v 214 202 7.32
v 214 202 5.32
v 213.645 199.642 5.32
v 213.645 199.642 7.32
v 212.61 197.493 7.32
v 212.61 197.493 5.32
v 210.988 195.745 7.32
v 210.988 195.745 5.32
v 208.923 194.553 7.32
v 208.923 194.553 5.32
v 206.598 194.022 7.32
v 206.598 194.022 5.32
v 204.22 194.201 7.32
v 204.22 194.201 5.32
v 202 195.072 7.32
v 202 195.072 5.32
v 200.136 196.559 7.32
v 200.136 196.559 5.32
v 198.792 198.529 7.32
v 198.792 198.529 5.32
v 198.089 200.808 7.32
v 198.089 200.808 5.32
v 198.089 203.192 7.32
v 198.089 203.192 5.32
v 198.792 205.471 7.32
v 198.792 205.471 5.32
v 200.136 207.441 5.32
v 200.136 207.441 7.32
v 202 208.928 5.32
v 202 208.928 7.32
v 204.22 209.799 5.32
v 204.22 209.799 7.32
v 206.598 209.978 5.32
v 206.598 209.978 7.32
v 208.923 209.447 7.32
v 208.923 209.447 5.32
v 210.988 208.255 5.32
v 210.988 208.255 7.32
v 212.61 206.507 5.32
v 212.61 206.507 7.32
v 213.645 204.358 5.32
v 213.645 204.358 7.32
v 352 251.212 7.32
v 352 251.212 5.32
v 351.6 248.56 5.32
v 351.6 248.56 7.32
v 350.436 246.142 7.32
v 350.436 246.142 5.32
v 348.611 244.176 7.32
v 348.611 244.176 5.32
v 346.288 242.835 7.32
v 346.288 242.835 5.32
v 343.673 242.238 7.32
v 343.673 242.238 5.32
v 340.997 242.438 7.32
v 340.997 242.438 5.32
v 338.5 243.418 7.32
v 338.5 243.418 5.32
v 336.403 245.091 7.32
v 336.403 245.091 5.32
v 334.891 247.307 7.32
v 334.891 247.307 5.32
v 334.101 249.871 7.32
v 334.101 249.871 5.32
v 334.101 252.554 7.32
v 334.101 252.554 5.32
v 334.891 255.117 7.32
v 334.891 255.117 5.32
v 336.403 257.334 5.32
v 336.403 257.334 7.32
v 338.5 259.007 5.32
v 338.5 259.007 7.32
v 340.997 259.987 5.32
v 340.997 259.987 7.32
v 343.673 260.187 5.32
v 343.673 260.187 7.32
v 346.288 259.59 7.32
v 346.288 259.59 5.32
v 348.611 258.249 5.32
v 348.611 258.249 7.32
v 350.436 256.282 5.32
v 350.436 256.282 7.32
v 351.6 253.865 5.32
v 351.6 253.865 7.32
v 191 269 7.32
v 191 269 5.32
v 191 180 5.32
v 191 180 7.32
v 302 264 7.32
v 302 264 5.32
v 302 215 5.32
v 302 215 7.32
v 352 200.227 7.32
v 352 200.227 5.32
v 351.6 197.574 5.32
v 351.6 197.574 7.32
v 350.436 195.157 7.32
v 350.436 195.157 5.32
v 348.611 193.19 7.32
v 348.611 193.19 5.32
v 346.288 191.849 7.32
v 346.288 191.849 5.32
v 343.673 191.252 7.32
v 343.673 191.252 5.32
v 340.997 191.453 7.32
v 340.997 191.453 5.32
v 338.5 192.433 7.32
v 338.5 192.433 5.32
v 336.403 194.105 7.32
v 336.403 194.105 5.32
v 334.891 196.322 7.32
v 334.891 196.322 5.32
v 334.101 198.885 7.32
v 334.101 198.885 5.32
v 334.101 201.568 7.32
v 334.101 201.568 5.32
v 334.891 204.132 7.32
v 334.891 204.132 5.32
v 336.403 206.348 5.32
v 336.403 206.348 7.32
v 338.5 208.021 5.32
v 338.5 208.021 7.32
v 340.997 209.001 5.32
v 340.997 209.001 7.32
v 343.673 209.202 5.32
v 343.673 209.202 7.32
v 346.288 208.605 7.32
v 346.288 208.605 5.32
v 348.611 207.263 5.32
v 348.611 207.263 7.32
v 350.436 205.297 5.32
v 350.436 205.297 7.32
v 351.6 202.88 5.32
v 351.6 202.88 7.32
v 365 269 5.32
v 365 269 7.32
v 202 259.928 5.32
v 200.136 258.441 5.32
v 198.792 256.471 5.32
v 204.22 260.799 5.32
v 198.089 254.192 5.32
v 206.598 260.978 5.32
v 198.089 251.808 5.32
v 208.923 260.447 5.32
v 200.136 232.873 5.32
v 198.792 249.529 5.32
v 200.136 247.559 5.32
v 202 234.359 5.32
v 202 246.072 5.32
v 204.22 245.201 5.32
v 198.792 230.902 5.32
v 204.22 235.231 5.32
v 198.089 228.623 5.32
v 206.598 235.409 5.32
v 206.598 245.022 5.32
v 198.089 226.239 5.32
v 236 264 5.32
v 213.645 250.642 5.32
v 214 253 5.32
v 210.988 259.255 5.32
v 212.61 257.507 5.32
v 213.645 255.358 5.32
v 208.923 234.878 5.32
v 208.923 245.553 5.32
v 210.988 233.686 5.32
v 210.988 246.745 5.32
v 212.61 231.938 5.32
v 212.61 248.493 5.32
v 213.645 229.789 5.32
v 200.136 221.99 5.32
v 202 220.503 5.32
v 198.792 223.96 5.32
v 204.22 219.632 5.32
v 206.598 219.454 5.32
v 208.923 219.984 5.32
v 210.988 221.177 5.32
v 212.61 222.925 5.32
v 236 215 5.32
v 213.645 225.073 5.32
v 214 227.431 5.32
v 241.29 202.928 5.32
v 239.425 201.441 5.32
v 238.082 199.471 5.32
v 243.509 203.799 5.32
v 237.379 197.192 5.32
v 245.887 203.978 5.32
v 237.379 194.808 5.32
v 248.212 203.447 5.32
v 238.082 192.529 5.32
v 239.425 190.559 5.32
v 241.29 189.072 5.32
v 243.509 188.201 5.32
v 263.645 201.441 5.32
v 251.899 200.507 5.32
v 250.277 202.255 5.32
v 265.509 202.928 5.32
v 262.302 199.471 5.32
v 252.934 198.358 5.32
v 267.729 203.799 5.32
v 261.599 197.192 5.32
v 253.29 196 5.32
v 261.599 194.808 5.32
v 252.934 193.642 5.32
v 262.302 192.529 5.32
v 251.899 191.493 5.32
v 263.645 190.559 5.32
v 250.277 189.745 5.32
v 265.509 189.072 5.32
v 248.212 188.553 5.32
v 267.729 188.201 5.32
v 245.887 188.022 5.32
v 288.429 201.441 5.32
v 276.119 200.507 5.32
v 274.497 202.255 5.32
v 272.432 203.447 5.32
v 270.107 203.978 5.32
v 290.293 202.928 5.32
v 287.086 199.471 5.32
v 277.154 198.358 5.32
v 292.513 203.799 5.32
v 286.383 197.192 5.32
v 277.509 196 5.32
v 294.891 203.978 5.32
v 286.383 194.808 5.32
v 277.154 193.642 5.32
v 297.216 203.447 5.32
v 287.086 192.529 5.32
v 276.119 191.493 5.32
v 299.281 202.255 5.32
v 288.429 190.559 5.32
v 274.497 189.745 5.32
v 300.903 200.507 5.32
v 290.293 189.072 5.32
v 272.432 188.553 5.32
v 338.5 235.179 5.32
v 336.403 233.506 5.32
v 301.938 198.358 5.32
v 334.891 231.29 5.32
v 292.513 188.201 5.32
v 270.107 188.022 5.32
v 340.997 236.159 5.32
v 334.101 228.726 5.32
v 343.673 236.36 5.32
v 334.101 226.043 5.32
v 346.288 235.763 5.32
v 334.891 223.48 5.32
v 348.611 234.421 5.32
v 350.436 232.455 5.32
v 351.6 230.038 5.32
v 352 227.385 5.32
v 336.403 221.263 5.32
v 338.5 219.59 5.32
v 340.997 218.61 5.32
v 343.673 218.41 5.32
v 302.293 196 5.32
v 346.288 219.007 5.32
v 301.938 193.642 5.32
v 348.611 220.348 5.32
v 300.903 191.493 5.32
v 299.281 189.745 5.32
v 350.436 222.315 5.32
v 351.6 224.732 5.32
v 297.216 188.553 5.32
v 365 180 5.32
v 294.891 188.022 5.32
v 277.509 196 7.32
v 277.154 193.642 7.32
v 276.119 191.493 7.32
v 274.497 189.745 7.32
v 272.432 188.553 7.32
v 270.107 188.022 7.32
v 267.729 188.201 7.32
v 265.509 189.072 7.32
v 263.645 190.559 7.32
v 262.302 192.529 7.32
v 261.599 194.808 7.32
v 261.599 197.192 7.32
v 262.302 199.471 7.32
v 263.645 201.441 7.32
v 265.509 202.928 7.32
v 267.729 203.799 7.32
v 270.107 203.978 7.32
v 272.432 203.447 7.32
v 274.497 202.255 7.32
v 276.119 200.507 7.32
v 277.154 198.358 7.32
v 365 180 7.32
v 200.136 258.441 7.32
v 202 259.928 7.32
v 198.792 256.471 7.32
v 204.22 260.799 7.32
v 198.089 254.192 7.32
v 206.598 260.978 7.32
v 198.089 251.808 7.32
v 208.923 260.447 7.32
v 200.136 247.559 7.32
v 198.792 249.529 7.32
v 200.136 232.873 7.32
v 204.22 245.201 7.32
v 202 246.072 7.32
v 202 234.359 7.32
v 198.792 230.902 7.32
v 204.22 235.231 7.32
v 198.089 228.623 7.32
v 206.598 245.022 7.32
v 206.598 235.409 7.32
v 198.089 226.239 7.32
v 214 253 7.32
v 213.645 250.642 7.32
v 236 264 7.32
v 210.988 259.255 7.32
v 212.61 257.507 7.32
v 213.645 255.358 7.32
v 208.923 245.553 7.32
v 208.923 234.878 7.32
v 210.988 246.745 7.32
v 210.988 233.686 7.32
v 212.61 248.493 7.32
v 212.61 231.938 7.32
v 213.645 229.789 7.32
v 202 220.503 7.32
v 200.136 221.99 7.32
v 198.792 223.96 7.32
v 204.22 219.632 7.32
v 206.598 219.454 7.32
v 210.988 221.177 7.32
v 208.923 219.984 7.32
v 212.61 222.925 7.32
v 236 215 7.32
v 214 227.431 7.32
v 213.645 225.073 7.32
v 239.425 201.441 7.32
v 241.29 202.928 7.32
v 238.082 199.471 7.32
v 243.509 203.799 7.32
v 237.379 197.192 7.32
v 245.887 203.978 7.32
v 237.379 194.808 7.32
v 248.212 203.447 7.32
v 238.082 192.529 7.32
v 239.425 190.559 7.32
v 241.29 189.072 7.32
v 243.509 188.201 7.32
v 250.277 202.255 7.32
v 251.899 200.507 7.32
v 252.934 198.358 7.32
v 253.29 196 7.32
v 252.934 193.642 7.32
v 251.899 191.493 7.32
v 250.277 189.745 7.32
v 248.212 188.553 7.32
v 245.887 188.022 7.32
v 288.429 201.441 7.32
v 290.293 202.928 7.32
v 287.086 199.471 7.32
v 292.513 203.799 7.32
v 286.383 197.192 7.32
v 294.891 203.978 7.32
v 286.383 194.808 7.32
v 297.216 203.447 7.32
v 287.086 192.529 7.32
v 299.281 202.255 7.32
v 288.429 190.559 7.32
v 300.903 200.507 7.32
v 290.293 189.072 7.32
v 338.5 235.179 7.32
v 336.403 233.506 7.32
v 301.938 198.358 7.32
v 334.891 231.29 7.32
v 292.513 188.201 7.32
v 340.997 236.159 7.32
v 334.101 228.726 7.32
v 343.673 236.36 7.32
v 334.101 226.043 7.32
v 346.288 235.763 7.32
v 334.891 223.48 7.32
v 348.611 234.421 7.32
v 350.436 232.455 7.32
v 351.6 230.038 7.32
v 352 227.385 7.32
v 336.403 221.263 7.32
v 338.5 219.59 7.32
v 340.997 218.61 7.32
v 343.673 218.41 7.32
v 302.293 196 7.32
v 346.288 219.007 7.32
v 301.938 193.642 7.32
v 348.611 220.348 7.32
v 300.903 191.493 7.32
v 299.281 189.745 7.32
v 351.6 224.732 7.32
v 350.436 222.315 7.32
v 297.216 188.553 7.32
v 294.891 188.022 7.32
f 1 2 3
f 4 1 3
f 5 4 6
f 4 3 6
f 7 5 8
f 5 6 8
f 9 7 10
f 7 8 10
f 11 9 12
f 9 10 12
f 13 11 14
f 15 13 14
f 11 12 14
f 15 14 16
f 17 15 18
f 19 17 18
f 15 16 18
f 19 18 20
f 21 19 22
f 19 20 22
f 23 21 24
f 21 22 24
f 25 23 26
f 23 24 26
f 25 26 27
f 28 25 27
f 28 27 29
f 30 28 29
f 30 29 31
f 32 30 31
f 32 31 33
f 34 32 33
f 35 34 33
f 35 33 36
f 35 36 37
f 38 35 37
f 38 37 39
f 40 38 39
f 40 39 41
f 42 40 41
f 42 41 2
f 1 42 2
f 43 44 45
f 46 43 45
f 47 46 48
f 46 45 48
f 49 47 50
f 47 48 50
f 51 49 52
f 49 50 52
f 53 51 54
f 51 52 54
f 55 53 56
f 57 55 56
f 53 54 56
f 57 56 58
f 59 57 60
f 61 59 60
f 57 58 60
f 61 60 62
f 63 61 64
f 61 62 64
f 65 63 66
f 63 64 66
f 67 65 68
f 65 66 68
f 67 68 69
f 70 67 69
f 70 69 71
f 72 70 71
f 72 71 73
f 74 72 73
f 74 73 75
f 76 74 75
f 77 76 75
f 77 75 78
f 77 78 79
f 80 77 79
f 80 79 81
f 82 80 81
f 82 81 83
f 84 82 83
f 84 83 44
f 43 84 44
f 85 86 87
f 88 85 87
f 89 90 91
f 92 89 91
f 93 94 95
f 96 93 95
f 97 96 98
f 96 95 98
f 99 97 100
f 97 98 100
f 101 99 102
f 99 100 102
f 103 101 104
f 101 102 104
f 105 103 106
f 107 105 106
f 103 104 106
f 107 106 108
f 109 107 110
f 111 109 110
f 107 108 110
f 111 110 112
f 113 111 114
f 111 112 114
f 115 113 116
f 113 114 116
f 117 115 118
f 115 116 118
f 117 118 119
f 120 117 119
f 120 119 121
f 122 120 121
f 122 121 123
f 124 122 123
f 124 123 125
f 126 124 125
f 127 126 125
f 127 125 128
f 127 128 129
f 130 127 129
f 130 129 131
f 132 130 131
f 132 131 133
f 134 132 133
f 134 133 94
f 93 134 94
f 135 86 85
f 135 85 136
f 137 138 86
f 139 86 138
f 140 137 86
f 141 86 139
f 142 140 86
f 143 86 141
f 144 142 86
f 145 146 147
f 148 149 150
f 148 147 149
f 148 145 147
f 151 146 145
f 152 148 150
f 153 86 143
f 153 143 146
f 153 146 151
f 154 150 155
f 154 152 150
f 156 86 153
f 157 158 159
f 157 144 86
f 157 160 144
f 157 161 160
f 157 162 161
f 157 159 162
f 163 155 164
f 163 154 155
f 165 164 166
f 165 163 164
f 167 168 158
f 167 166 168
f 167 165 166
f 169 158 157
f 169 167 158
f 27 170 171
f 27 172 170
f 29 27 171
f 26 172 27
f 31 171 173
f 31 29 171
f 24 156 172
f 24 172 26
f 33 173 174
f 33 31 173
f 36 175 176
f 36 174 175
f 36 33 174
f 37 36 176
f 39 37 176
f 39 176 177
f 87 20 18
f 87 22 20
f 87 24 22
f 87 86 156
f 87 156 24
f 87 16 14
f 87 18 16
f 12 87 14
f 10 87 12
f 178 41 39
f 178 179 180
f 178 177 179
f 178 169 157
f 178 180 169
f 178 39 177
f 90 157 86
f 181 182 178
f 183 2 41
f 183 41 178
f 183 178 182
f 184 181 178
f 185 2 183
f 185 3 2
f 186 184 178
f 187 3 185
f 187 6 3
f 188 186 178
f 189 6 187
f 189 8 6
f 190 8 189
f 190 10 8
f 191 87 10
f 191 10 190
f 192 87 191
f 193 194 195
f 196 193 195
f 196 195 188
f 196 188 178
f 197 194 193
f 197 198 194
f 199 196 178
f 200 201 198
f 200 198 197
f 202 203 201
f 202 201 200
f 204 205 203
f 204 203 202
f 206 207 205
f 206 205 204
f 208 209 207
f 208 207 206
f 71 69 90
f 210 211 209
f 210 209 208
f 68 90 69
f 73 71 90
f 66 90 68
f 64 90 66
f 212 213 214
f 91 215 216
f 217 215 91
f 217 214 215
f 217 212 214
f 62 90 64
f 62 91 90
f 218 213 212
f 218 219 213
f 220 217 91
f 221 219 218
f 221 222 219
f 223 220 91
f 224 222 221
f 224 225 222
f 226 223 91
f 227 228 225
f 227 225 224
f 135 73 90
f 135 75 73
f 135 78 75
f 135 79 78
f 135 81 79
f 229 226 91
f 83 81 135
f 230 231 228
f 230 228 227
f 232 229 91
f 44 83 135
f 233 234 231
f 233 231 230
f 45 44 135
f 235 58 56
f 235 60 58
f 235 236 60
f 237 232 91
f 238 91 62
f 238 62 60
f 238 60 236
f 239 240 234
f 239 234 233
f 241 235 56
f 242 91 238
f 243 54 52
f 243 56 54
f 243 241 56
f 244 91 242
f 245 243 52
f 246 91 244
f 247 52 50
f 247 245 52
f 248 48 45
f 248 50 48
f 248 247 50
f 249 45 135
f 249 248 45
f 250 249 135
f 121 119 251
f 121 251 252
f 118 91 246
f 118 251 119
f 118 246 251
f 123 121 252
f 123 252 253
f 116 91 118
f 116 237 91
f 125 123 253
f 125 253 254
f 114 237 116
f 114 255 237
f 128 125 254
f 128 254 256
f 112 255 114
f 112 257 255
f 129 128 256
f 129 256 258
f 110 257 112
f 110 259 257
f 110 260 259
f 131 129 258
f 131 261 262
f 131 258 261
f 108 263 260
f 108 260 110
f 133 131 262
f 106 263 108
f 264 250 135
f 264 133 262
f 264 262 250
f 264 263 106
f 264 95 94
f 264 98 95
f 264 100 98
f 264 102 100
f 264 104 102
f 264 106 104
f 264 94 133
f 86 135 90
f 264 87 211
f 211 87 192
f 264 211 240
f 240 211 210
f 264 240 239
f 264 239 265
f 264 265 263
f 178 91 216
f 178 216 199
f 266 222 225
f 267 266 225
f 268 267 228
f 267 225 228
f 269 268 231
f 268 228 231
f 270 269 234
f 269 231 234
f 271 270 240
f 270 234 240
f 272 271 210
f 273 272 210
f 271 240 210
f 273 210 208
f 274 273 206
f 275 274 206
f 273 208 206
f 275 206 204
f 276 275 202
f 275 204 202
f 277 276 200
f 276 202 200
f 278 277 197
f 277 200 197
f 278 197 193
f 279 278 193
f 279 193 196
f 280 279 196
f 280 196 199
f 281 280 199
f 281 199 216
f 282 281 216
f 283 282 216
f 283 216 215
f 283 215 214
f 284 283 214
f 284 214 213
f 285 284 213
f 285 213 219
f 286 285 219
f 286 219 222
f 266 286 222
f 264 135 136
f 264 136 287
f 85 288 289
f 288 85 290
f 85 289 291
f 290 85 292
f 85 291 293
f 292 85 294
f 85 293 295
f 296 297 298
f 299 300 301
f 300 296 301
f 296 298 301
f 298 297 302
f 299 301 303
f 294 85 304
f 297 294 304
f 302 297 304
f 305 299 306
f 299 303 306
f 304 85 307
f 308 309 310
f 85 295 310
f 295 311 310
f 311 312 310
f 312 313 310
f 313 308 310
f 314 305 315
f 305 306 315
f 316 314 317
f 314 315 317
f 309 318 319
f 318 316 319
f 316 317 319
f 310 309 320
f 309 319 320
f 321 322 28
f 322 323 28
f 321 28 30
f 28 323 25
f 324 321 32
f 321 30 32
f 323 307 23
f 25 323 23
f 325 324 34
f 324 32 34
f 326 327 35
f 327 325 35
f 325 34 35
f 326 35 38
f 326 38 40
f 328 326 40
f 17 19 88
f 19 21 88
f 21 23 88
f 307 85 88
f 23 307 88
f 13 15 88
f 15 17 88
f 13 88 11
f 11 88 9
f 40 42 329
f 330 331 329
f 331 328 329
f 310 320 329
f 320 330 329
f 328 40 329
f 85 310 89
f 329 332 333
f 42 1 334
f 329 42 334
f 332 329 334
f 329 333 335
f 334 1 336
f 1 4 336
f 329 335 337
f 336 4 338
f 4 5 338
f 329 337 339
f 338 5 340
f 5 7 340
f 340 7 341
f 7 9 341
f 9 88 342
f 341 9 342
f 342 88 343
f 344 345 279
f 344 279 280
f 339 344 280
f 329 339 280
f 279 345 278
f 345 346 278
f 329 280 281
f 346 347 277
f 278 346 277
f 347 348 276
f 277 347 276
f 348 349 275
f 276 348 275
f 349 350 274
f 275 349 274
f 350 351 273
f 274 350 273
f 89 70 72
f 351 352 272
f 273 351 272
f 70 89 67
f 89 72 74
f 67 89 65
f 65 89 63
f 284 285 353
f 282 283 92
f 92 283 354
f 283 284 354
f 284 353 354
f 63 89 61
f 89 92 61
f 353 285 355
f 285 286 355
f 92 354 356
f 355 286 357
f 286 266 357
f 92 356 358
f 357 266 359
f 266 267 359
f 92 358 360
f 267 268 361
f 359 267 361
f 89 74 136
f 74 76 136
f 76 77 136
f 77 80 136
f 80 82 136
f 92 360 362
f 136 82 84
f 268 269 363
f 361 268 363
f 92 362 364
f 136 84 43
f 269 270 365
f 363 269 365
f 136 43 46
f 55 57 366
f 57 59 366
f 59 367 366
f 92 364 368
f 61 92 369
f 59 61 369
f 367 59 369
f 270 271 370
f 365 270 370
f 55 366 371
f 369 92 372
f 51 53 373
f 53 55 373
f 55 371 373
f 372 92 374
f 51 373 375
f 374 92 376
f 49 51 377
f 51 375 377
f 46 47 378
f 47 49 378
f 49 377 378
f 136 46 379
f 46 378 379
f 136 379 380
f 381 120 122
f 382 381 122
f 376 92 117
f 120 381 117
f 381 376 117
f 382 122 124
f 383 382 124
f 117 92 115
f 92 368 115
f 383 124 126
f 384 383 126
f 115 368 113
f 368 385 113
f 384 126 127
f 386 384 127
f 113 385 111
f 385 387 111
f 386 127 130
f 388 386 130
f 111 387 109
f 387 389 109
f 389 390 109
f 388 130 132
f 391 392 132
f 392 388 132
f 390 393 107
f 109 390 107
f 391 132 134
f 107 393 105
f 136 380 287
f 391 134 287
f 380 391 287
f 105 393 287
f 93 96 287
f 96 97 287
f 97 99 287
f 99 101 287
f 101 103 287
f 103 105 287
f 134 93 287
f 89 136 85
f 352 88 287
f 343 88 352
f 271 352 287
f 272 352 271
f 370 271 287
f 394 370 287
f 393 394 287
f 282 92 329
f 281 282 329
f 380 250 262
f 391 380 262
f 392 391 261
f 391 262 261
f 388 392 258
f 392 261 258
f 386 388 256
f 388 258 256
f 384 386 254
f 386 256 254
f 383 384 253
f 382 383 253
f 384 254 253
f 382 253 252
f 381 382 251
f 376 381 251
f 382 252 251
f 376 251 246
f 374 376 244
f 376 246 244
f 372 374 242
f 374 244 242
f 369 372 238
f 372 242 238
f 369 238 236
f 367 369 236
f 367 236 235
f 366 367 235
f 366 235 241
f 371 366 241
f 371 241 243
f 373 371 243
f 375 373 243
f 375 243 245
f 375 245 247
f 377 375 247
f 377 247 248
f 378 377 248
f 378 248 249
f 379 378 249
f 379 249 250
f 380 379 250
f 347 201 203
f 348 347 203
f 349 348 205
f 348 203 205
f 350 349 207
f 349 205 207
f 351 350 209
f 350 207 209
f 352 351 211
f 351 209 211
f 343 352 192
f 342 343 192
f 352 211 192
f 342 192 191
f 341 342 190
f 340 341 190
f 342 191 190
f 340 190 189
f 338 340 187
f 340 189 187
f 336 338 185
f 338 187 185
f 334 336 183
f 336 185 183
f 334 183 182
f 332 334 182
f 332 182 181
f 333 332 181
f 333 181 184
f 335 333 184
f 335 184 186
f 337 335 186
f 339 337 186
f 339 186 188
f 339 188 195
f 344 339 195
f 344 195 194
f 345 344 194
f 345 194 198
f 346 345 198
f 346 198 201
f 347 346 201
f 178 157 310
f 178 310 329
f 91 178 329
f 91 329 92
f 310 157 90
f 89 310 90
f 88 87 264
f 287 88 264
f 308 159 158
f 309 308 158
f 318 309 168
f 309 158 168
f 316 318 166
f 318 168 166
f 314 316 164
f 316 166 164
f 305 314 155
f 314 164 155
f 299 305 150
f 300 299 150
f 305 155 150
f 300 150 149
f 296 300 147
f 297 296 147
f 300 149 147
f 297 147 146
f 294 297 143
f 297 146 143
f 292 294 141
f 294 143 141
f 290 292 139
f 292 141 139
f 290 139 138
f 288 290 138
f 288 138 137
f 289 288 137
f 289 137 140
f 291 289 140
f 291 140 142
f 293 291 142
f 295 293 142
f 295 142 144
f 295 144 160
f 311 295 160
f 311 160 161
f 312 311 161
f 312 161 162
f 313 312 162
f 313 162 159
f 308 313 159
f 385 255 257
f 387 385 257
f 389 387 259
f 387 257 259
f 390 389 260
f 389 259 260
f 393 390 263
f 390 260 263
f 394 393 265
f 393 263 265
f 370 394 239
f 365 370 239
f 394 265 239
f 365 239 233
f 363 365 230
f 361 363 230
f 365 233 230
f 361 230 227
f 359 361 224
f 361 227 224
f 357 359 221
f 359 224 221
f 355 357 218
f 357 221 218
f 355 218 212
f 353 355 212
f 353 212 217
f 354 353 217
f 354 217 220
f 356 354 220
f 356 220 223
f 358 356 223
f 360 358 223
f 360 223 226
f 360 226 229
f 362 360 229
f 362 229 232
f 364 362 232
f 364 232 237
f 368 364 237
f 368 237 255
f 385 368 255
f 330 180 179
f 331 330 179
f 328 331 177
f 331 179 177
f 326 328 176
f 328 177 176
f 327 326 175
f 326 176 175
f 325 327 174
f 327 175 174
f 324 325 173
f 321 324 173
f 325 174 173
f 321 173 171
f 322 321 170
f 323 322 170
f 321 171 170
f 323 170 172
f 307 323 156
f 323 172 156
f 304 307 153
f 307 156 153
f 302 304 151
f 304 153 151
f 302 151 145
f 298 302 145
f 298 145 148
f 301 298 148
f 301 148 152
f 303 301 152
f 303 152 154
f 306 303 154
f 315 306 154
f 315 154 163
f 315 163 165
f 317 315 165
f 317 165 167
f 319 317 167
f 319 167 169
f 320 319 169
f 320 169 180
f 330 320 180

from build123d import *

# Parameters (mm, degrees)
SKETCH153_W      = 176
SKETCH153_H      = 2.5
EXTRUDE139_DEPTH = 4
SKETCH163_R      = 8
SKETCH163_R_2    = 9
EXTRUDE145_DEPTH = 4
SKETCH034_W      = 66
SKETCH034_H      = 49
EXTRUDE028_DEPTH = 4
SKETCH148_W      = 174
SKETCH148_H      = 90
EXTRUDE136_DEPTH = 2


with BuildPart() as clamshell:
    # Sketch153 → Extrude139 (new body)
    with BuildSketch(Plane(origin=(0, 0, 4.32), x_dir=(1, 0, 0), z_dir=(0, 0, -1))):
        with Locations((278, -270.25)):
            Rectangle(SKETCH153_W, SKETCH153_H)
    extrude(amount=-EXTRUDE139_DEPTH)


with BuildPart() as extrude145:
    # Sketch163 → Extrude145 (new body)
    with BuildSketch(Plane(origin=(0, 0, 4.32), x_dir=(1, 0, 0), z_dir=(0, 0, -1))):
        with Locations((206, -202)):
            Circle(SKETCH163_R)
        with Locations((206, -227.431152)):
            Circle(SKETCH163_R)
        with Locations((206, -253)):
            Circle(SKETCH163_R)
        with Locations((343, -200.226852)):
            Circle(SKETCH163_R_2)
        with Locations((343, -227.384705)):
            Circle(SKETCH163_R_2)
        with Locations((343, -251.212372)):
            Circle(SKETCH163_R_2)
        with Locations((245.289581, -196)):
            Circle(SKETCH163_R)
        with Locations((269.509308, -196)):
            Circle(SKETCH163_R)
        with Locations((294.293335, -196)):
            Circle(SKETCH163_R)
    extrude(amount=-EXTRUDE145_DEPTH)


with BuildPart() as bottom_holes:
    # Sketch034 → Extrude028 (new body)
    with BuildSketch(Plane(origin=(0, 0, 4.32), x_dir=(1, 0, 0), z_dir=(0, 0, -1))):
        with Locations((269, -239.5)):
            Rectangle(SKETCH034_W, SKETCH034_H)
    extrude(amount=-EXTRUDE028_DEPTH)

    # Compound007: union clamshell, Extrude145
    add(clamshell.part)
    add(extrude145.part)


with BuildPart() as floor001:
    # Sketch148 → Extrude136 (new body)
    with BuildSketch(Plane(origin=(0, 0, 5.32), x_dir=(1, 0, 0), z_dir=(0, 0, -1))):
        with Locations((278, -225)):
            Rectangle(SKETCH148_W, SKETCH148_H)
    extrude(amount=-EXTRUDE136_DEPTH)

    # Cut008: cut bottom holes
    add(bottom_holes.part, mode=Mode.SUBTRACT)


solid = floor001.part
